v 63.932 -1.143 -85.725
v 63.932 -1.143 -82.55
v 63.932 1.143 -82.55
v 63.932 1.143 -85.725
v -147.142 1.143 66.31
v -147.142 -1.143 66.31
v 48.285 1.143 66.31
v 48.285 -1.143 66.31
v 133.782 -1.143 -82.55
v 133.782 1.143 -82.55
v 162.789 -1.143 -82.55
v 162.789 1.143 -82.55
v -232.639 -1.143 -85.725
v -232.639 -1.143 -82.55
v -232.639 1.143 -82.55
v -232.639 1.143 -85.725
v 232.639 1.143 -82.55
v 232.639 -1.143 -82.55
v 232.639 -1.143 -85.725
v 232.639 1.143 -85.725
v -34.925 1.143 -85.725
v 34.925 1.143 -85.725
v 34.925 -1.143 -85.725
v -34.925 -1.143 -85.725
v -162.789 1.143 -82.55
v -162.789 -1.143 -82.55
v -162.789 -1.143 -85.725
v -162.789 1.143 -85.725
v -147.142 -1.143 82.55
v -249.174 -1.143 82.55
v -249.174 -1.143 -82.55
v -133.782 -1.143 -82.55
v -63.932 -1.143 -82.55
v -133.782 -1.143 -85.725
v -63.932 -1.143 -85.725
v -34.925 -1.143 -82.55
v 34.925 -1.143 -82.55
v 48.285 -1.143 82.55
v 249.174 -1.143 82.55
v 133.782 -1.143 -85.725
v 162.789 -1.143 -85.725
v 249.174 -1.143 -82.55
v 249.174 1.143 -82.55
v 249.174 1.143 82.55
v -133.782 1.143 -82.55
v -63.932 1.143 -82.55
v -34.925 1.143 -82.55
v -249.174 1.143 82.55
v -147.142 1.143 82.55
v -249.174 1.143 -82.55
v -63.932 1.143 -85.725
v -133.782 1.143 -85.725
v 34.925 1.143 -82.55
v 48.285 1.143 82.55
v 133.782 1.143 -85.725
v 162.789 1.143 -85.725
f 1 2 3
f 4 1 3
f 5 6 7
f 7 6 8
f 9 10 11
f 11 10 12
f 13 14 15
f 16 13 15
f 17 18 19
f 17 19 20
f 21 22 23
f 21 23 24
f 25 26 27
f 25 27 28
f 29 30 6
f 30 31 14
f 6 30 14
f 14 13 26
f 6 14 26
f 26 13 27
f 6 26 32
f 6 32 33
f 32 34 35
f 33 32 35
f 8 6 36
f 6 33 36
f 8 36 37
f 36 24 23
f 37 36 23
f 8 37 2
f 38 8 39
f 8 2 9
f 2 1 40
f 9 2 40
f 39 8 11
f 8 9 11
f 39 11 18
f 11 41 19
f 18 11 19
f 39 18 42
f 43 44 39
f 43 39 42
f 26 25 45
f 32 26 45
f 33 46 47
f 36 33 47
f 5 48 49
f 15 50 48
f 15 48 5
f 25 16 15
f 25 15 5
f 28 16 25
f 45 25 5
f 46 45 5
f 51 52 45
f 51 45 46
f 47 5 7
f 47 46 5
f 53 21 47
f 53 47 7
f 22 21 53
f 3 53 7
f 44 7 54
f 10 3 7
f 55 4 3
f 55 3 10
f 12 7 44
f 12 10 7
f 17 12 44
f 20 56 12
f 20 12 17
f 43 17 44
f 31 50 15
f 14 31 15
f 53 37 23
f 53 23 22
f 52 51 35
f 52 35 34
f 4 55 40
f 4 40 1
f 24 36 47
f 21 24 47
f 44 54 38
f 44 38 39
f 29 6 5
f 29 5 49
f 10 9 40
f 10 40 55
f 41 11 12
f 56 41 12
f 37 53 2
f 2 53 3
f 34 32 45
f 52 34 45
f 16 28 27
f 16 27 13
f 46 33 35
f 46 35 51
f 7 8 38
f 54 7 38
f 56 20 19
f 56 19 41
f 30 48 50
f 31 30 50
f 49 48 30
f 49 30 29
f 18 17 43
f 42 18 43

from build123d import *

# Parameters (mm, degrees)
SKETCH1_W           = 498.348
SKETCH1_H           = 165.1
BOSS_EXTRUDE1_DEPTH = 1.143
SKETCH2_W           = 69.85
SKETCH2_H           = 2.286
BOSS_EXTRUDE2_DEPTH = 3.175
LPATTERN1_COUNT     = 5
LPATTERN1_PITCH     = 98.8568
SKETCH3_W           = 96.5708
SKETCH3_H           = 16.239769195
SKETCH3_W_2         = 1.143
CUT_EXTRUDE1_DEPTH  = 264.517900145


with BuildPart() as part:
    # Sketch1 → Boss-Extrude1 (new, symmetric)
    with BuildSketch(Plane(origin=(0, 0, 0), x_dir=(1, 0, 0), z_dir=(0, 1, 0))):
        Rectangle(SKETCH1_W, SKETCH1_H)
    extrude(amount=BOSS_EXTRUDE1_DEPTH, both=True)

    # Sketch2 → Boss-Extrude2 (add)
    with BuildSketch(Plane(origin=(0, 0, -82.55), x_dir=(-1, 0, 0), z_dir=(0, 0, -1))):
        with Locations((-197.7136, 0)):
            Rectangle(SKETCH2_W, SKETCH2_H)
    boss_extrude2 = extrude(amount=BOSS_EXTRUDE2_DEPTH)

    # LPattern1: Boss-Extrude2 ×5
    with Locations(*[(-i * LPATTERN1_PITCH, 0, 0) for i in range(1, LPATTERN1_COUNT)]):
        add(boss_extrude2)

    # Sketch3 → Cut-Extrude1 (cut, through all)
    with BuildSketch(Plane.XZ.offset(1.143)):
        with Locations((-98.8568, 74.430115403)):
            Rectangle(SKETCH3_W, SKETCH3_H)
        with Locations((-48.8569, 74.430115403)):
            Rectangle(SKETCH3_W_2, SKETCH3_H)
        with Locations((-49.9999, 74.430115403)):
            Rectangle(SKETCH3_W_2, SKETCH3_H)
        with Locations((0, 74.430115403)):
            Rectangle(SKETCH3_W, SKETCH3_H)
    extrude(amount=-CUT_EXTRUDE1_DEPTH, mode=Mode.SUBTRACT)


solid = part.part
